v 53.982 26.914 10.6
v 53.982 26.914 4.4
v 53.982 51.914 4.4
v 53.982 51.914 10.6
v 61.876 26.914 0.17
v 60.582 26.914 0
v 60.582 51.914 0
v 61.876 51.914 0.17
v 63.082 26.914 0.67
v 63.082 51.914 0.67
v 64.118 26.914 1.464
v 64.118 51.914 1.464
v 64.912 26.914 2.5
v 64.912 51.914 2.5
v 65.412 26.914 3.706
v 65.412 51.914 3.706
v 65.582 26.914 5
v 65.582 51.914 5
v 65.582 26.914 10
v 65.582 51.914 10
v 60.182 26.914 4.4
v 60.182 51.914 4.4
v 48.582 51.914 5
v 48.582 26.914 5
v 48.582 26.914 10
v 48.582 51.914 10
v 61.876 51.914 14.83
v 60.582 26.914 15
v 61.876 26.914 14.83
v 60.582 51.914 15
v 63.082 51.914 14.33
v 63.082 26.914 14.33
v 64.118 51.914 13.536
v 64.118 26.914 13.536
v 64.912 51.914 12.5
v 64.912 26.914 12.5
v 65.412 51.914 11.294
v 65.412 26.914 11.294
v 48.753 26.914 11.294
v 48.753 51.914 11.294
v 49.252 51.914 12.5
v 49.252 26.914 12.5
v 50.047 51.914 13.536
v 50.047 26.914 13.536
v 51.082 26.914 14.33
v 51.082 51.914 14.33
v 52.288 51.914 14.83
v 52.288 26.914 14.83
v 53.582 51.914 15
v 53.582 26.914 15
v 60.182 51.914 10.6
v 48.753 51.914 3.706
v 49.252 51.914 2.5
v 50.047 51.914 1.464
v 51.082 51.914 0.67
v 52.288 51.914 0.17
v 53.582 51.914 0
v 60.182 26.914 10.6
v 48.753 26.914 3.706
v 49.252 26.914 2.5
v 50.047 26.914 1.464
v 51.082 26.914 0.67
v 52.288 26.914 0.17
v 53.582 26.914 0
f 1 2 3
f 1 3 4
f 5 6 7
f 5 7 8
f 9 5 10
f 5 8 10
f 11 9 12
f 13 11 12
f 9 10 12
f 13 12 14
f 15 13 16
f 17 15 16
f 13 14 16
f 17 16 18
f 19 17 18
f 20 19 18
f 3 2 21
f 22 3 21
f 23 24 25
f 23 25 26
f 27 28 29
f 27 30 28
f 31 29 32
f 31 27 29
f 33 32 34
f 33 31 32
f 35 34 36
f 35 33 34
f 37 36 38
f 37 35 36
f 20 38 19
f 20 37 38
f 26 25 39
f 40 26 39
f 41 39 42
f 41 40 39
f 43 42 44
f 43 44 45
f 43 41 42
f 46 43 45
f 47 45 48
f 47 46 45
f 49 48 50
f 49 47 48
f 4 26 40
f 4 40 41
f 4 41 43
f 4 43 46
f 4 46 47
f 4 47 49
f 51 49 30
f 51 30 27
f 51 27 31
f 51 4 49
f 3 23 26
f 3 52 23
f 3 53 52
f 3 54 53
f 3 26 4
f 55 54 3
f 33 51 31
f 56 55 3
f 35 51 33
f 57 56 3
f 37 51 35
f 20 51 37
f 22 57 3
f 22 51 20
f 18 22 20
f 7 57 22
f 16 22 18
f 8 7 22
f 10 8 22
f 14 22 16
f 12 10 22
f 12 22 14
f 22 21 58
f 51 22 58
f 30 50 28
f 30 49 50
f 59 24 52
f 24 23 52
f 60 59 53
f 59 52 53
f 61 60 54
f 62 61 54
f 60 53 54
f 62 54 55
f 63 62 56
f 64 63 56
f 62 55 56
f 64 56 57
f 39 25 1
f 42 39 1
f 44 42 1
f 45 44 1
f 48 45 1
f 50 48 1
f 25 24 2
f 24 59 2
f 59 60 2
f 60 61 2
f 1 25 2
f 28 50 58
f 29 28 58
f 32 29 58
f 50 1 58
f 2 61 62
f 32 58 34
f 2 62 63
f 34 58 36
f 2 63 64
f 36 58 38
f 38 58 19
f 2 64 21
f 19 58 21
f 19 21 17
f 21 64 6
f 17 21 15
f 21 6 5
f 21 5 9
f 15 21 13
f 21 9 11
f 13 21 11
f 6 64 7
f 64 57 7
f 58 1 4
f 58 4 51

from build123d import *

# Parameters (mm, degrees)
SKETCH1_W           = 17
SKETCH1_H           = 25
BOSS_EXTRUDE1_DEPTH = 15
SKETCH2_W           = 6.2
SKETCH2_H           = 6.2
CUT_EXTRUDE1_DEPTH  = 3.25
SKETCH3_W           = 6.2
SKETCH3_H           = 6.2
CUT_EXTRUDE2_DEPTH  = 3.25
FILLET1_R           = 5
SKETCH6_W           = 6.2
SKETCH6_H           = 6.2
CUT_EXTRUDE3_DEPTH  = 71.704212299


with BuildPart() as part:
    # Sketch1 → Boss-Extrude1 (new body)
    with BuildSketch(Plane.XY):
        with Locations((57.082186124, 39.41449257)):
            Rectangle(SKETCH1_W, SKETCH1_H)
    extrude(amount=BOSS_EXTRUDE1_DEPTH)

    # Sketch2 → Cut-Extrude1 (cut)
    with BuildSketch(Plane.XZ.offset(-26.91449257)):
        with Locations((57.082186124, 7.5)):
            Rectangle(SKETCH2_W, SKETCH2_H)
    extrude(amount=-CUT_EXTRUDE1_DEPTH, mode=Mode.SUBTRACT)

    # Sketch3 → Cut-Extrude2 (cut)
    with BuildSketch(Plane(origin=(0, 51.91449257, 0), x_dir=(1, 0, 0), z_dir=(0, 1, 0))):
        with Locations((57.082186124, -7.5)):
            Rectangle(SKETCH3_W, SKETCH3_H)
    extrude(amount=-CUT_EXTRUDE2_DEPTH, mode=Mode.SUBTRACT)

    # Fillet1
    fillet1_edges = [part.edges().sort_by_distance(p)[0] for p in [
        (48.582186124, 39.41449257, 15),
        (65.582186124, 39.41449257, 15),
        (48.582186124, 39.41449257, 0),
        (65.582186124, 39.41449257, 0),
    ]]
    fillet(fillet1_edges, radius=FILLET1_R)

    # Sketch6 → Cut-Extrude3 (cut, through all)
    with BuildSketch(Plane(origin=(0, 48.66449257, 0), x_dir=(1, 0, 0), z_dir=(0, 1, 0))):
        with Locations((57.082186124, -7.5)):
            Rectangle(SKETCH6_W, SKETCH6_H)
    extrude(amount=-CUT_EXTRUDE3_DEPTH, mode=Mode.SUBTRACT)


solid = part.part
